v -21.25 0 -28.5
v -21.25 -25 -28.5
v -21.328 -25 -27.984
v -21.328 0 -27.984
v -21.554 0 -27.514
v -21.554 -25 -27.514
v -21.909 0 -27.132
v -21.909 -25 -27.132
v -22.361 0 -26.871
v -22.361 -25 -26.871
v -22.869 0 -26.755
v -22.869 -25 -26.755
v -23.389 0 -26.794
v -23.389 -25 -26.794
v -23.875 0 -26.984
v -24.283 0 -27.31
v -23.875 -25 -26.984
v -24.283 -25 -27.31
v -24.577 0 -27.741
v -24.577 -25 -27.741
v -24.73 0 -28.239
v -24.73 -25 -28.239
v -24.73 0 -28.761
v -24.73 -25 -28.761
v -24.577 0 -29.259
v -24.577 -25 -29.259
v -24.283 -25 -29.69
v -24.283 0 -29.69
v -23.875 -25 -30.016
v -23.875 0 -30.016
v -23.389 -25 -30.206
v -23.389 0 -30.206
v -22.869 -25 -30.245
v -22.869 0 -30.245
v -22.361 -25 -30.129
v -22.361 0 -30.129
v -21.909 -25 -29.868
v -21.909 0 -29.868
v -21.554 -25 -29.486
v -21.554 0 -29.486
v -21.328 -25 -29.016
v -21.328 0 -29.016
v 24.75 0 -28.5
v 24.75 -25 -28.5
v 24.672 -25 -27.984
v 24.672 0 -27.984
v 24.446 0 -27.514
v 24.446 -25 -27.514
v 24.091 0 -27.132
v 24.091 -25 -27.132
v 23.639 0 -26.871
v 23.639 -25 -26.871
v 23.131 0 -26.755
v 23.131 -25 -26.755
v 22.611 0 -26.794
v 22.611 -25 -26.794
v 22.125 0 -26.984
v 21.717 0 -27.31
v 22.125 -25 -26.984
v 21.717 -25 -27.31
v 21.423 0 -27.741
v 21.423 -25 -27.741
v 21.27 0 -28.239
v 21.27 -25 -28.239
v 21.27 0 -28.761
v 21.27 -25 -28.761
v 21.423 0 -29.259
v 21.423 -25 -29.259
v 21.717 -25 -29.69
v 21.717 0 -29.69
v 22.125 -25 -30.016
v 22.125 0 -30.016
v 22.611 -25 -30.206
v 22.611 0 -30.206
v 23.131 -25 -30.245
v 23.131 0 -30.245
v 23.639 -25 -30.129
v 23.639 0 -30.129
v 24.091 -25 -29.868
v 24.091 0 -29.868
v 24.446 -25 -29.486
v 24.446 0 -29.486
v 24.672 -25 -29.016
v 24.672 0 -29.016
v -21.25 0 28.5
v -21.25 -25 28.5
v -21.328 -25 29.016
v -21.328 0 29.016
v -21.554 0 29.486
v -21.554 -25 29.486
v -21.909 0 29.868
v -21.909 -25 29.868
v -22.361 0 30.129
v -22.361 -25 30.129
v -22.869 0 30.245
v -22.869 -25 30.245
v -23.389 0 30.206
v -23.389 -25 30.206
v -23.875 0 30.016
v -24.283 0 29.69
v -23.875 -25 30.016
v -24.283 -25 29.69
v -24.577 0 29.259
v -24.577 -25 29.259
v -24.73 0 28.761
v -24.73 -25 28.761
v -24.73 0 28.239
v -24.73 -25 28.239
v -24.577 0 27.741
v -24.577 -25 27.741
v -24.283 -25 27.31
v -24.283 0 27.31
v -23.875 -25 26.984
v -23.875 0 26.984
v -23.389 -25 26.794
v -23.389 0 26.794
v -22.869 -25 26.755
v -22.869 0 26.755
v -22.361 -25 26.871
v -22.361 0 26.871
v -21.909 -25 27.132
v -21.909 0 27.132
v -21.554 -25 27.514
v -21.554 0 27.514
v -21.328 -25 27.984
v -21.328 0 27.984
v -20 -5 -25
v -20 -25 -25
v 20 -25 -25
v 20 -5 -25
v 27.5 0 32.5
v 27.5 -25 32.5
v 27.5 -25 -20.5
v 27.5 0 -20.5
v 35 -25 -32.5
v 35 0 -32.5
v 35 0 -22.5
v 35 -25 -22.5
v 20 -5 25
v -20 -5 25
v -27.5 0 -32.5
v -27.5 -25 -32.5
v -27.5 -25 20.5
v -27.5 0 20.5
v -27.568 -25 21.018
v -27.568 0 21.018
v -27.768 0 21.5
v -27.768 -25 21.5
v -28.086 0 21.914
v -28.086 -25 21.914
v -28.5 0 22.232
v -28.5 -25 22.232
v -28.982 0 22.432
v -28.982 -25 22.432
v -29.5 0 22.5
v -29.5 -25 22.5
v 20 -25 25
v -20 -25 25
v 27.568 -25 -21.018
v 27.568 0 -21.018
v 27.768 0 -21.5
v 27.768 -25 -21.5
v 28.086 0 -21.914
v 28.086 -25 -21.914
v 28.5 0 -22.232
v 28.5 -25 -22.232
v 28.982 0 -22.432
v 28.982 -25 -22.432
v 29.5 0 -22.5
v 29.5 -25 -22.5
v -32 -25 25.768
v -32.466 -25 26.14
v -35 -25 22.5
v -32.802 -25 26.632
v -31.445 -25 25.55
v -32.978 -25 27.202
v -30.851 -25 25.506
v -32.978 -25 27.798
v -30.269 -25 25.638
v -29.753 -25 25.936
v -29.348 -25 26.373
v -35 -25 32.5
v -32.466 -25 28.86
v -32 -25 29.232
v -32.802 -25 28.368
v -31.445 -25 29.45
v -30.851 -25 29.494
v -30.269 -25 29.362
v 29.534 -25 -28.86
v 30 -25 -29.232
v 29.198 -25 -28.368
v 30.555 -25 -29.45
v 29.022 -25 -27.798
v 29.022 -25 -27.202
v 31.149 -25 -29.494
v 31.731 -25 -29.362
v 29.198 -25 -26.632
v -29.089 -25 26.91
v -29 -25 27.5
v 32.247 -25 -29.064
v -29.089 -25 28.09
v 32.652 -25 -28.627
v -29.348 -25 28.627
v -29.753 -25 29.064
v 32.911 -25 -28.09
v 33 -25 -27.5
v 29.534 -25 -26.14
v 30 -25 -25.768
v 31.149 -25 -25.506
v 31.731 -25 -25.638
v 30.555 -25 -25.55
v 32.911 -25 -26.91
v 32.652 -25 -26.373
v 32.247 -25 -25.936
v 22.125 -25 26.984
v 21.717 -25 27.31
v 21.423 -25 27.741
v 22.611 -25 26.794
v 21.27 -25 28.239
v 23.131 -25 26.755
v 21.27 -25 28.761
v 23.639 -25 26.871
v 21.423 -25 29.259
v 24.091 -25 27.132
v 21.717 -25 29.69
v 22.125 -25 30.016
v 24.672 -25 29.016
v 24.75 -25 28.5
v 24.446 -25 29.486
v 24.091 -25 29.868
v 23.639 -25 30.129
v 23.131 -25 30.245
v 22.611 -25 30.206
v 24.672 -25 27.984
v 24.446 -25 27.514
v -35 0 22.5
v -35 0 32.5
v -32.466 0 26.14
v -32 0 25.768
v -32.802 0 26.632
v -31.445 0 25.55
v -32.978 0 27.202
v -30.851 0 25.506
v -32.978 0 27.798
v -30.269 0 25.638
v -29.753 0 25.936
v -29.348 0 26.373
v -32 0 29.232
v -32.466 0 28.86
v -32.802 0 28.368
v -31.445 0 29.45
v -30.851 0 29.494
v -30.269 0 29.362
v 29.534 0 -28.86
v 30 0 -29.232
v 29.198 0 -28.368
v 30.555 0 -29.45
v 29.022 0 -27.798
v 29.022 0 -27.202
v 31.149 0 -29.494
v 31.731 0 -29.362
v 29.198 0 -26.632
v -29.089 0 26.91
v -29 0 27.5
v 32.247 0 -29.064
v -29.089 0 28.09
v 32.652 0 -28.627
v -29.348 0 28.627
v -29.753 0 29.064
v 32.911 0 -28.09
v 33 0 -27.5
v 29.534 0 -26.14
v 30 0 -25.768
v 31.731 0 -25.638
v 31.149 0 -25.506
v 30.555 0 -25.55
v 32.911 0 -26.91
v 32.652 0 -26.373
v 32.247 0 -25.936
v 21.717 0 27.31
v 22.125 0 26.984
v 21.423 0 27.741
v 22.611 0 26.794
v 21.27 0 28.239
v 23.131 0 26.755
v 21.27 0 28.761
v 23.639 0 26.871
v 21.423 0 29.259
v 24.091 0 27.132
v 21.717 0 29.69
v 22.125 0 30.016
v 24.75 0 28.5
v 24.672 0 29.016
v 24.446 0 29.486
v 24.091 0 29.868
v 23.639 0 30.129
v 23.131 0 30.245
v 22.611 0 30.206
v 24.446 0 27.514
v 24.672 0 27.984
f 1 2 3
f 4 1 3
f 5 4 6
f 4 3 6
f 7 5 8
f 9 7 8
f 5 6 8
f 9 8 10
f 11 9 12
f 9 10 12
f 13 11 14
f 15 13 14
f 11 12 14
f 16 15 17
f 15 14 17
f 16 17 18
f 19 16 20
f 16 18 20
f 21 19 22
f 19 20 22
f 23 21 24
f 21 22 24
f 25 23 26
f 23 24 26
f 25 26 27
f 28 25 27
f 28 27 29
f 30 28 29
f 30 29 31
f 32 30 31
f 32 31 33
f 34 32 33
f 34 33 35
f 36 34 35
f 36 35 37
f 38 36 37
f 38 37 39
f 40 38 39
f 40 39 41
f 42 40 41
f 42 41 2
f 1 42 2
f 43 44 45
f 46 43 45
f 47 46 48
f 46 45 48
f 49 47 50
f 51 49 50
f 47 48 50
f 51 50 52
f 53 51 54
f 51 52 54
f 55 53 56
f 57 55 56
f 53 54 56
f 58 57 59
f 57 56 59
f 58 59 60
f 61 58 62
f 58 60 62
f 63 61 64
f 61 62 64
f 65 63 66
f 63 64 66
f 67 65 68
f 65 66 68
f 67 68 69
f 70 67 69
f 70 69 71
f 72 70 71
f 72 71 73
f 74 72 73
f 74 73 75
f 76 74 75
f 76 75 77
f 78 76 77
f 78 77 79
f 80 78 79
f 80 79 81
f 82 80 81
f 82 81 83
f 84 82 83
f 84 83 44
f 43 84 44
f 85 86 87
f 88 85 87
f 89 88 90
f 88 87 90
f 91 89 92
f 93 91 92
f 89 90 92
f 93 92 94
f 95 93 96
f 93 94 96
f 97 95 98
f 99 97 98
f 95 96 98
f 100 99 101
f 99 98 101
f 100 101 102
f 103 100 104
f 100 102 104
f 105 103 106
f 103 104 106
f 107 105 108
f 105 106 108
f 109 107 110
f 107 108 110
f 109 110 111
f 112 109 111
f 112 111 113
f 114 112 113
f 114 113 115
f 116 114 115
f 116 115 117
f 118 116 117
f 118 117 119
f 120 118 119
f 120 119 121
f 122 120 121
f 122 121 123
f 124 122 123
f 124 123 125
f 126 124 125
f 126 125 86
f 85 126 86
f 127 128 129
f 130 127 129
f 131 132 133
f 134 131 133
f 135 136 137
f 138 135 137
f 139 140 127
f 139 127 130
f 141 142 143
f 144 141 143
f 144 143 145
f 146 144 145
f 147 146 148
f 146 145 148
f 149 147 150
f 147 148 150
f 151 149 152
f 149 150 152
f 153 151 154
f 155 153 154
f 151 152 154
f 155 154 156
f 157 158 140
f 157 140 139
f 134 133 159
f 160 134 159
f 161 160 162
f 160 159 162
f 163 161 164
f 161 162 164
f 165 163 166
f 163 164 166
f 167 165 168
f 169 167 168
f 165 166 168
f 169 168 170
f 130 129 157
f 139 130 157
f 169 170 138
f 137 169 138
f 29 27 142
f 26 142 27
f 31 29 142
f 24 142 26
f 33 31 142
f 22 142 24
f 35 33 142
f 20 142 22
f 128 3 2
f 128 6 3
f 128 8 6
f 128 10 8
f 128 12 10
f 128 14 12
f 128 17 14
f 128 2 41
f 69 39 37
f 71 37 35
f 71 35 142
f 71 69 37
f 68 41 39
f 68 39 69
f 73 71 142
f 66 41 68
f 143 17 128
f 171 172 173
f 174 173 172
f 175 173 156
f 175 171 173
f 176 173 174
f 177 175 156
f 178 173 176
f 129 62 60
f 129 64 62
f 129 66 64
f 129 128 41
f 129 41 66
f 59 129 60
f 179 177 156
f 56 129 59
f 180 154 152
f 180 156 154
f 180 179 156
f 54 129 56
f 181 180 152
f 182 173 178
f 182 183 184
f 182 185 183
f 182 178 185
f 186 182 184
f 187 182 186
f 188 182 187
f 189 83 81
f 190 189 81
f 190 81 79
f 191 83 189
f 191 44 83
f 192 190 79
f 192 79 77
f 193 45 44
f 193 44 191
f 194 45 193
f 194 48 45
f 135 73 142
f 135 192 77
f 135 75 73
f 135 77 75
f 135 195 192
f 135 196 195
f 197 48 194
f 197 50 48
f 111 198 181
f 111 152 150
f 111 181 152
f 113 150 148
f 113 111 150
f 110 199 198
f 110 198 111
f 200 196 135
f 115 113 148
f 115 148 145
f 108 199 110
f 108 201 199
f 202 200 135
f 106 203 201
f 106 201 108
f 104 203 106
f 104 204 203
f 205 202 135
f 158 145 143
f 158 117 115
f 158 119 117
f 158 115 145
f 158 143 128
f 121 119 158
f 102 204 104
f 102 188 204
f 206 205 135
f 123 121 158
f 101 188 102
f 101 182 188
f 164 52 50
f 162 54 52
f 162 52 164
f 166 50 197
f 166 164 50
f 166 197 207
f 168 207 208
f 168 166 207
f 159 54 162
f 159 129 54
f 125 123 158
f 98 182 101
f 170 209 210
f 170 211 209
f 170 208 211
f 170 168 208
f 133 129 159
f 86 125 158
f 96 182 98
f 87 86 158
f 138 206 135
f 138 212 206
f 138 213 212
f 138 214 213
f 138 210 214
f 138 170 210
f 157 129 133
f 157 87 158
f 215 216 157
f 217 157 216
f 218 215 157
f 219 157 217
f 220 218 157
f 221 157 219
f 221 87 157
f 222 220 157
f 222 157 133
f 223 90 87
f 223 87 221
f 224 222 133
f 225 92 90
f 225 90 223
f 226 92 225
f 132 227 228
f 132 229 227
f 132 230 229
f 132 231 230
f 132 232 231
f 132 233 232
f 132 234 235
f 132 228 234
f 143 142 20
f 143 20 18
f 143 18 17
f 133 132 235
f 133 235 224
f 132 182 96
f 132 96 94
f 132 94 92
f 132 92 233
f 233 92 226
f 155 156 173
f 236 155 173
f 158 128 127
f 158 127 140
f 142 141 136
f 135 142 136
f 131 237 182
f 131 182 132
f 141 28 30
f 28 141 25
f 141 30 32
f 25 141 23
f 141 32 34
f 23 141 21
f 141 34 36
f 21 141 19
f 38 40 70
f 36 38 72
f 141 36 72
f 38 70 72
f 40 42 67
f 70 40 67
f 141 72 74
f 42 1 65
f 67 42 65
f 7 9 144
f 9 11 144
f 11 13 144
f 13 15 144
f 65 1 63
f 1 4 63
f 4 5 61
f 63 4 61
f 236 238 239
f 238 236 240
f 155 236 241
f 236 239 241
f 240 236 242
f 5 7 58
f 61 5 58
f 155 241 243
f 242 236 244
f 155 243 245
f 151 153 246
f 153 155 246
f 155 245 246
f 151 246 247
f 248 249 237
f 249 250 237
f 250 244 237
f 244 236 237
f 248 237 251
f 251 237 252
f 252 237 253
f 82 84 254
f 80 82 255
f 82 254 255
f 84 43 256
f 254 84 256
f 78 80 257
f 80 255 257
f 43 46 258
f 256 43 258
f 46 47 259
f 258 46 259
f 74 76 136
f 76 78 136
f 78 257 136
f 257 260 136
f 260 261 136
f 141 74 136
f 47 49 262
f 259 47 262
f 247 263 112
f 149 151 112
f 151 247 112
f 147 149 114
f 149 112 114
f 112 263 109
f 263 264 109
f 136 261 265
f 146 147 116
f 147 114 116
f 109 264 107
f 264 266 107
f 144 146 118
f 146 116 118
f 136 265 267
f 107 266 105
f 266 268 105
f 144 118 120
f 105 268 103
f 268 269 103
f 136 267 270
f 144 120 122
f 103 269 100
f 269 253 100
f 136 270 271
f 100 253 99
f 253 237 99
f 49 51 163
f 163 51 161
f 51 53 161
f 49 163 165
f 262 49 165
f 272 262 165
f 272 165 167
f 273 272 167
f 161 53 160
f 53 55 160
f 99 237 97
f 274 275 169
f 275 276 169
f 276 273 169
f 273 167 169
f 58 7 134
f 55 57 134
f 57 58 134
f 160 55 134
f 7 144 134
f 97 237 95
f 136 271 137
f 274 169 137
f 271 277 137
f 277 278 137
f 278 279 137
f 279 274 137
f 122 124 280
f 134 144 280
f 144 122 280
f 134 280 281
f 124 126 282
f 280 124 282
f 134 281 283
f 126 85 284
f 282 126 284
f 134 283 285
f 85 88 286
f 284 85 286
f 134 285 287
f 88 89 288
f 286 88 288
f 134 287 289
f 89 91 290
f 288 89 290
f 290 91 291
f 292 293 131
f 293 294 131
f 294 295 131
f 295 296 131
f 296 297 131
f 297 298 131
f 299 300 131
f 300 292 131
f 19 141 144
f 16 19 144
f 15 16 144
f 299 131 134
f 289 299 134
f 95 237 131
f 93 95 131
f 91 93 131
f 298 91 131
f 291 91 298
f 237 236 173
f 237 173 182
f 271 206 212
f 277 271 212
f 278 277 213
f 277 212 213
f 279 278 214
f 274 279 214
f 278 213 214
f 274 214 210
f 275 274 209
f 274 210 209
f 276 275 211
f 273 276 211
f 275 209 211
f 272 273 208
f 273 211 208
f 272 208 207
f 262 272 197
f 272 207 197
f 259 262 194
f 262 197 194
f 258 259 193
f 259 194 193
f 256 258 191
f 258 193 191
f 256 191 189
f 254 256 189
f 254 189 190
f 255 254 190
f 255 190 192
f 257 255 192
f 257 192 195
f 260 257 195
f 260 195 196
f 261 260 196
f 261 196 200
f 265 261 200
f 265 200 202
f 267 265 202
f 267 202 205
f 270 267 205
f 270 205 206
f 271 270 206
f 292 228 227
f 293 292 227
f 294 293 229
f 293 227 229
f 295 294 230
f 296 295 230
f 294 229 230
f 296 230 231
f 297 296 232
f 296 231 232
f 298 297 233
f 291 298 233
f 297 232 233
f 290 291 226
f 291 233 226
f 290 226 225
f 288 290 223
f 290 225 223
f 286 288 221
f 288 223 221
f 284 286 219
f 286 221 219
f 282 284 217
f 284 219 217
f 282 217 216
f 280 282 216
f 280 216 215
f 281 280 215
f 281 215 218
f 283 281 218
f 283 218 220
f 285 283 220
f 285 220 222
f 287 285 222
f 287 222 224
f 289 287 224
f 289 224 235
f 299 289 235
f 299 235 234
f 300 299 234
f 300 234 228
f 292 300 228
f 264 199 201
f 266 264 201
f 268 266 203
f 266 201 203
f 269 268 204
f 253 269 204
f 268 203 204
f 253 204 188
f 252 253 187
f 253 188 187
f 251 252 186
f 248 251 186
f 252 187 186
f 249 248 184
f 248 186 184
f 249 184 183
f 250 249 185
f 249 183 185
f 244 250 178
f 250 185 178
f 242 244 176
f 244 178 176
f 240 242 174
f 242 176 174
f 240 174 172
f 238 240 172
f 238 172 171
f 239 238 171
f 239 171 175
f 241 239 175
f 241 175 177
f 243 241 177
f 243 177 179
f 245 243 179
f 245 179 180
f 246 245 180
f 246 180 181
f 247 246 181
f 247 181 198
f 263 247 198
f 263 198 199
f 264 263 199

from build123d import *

# Parameters (mm, degrees)
F0_W     = 70
F0_H     = 65
F1_DEPTH = 25
F2_W     = 40
F2_H     = 50
F3_DEPTH = 20
F5_DEPTH = 25.001
F7_DEPTH = 25.001
F8_R     = 2
F8_R_2   = 1.75
F9_DEPTH = 25.001


with BuildPart() as f1:
    # F0 (on Front) → F1 (new body)
    with BuildSketch(Plane.XZ):
        Rectangle(F0_W, F0_H)
    extrude(amount=F1_DEPTH)

    # F2 (on face) → F3 (cut)
    with BuildSketch(Plane.XZ.offset(25)):
        Rectangle(F2_W, F2_H)
    extrude(amount=-F3_DEPTH, mode=Mode.SUBTRACT)

    # F4 (on face) → F5 (cut, through all)
    with BuildSketch(Plane.XZ.offset(25)):
        with BuildLine():
            Line((-35, 22.5), (-35, -32.5))
            Line((-35, -32.5), (-27.5, -32.5))
            Line((-27.5, -32.5), (-27.5, 20.5))
            ThreePointArc((-27.5, 20.5), (-28.085786, 21.914214), (-29.5, 22.5))
            Line((-29.5, 22.5), (-35, 22.5))
        make_face()
    extrude(amount=-F5_DEPTH, mode=Mode.SUBTRACT)

    # F6 (on face) → F7 (cut, through all)
    with BuildSketch(Plane.XZ.offset(25)):
        with BuildLine():
            Line((35, -22.5), (35, 32.5))
            Line((35, 32.5), (27.5, 32.5))
            Line((27.5, 32.5), (27.5, -20.5))
            ThreePointArc((27.5, -20.5), (28.085786, -21.914214), (29.5, -22.5))
            Line((29.5, -22.5), (35, -22.5))
        make_face()
    extrude(amount=-F7_DEPTH, mode=Mode.SUBTRACT)

    # F8 (on face) → F9 (cut, through all)
    with BuildSketch(Plane.XZ.offset(25)):
        with Locations((-31, 27.5)):
            Circle(F8_R)
        with Locations((31, -27.5)):
            Circle(F8_R)
        with Locations((-23, 28.5)):
            Circle(F8_R_2)
        with Locations((23, 28.5)):
            Circle(F8_R_2)
        with Locations((-23, -28.5)):
            Circle(F8_R_2)
        with Locations((23, -28.5)):
            Circle(F8_R_2)
    extrude(amount=-F9_DEPTH, mode=Mode.SUBTRACT)


solid = f1.part
